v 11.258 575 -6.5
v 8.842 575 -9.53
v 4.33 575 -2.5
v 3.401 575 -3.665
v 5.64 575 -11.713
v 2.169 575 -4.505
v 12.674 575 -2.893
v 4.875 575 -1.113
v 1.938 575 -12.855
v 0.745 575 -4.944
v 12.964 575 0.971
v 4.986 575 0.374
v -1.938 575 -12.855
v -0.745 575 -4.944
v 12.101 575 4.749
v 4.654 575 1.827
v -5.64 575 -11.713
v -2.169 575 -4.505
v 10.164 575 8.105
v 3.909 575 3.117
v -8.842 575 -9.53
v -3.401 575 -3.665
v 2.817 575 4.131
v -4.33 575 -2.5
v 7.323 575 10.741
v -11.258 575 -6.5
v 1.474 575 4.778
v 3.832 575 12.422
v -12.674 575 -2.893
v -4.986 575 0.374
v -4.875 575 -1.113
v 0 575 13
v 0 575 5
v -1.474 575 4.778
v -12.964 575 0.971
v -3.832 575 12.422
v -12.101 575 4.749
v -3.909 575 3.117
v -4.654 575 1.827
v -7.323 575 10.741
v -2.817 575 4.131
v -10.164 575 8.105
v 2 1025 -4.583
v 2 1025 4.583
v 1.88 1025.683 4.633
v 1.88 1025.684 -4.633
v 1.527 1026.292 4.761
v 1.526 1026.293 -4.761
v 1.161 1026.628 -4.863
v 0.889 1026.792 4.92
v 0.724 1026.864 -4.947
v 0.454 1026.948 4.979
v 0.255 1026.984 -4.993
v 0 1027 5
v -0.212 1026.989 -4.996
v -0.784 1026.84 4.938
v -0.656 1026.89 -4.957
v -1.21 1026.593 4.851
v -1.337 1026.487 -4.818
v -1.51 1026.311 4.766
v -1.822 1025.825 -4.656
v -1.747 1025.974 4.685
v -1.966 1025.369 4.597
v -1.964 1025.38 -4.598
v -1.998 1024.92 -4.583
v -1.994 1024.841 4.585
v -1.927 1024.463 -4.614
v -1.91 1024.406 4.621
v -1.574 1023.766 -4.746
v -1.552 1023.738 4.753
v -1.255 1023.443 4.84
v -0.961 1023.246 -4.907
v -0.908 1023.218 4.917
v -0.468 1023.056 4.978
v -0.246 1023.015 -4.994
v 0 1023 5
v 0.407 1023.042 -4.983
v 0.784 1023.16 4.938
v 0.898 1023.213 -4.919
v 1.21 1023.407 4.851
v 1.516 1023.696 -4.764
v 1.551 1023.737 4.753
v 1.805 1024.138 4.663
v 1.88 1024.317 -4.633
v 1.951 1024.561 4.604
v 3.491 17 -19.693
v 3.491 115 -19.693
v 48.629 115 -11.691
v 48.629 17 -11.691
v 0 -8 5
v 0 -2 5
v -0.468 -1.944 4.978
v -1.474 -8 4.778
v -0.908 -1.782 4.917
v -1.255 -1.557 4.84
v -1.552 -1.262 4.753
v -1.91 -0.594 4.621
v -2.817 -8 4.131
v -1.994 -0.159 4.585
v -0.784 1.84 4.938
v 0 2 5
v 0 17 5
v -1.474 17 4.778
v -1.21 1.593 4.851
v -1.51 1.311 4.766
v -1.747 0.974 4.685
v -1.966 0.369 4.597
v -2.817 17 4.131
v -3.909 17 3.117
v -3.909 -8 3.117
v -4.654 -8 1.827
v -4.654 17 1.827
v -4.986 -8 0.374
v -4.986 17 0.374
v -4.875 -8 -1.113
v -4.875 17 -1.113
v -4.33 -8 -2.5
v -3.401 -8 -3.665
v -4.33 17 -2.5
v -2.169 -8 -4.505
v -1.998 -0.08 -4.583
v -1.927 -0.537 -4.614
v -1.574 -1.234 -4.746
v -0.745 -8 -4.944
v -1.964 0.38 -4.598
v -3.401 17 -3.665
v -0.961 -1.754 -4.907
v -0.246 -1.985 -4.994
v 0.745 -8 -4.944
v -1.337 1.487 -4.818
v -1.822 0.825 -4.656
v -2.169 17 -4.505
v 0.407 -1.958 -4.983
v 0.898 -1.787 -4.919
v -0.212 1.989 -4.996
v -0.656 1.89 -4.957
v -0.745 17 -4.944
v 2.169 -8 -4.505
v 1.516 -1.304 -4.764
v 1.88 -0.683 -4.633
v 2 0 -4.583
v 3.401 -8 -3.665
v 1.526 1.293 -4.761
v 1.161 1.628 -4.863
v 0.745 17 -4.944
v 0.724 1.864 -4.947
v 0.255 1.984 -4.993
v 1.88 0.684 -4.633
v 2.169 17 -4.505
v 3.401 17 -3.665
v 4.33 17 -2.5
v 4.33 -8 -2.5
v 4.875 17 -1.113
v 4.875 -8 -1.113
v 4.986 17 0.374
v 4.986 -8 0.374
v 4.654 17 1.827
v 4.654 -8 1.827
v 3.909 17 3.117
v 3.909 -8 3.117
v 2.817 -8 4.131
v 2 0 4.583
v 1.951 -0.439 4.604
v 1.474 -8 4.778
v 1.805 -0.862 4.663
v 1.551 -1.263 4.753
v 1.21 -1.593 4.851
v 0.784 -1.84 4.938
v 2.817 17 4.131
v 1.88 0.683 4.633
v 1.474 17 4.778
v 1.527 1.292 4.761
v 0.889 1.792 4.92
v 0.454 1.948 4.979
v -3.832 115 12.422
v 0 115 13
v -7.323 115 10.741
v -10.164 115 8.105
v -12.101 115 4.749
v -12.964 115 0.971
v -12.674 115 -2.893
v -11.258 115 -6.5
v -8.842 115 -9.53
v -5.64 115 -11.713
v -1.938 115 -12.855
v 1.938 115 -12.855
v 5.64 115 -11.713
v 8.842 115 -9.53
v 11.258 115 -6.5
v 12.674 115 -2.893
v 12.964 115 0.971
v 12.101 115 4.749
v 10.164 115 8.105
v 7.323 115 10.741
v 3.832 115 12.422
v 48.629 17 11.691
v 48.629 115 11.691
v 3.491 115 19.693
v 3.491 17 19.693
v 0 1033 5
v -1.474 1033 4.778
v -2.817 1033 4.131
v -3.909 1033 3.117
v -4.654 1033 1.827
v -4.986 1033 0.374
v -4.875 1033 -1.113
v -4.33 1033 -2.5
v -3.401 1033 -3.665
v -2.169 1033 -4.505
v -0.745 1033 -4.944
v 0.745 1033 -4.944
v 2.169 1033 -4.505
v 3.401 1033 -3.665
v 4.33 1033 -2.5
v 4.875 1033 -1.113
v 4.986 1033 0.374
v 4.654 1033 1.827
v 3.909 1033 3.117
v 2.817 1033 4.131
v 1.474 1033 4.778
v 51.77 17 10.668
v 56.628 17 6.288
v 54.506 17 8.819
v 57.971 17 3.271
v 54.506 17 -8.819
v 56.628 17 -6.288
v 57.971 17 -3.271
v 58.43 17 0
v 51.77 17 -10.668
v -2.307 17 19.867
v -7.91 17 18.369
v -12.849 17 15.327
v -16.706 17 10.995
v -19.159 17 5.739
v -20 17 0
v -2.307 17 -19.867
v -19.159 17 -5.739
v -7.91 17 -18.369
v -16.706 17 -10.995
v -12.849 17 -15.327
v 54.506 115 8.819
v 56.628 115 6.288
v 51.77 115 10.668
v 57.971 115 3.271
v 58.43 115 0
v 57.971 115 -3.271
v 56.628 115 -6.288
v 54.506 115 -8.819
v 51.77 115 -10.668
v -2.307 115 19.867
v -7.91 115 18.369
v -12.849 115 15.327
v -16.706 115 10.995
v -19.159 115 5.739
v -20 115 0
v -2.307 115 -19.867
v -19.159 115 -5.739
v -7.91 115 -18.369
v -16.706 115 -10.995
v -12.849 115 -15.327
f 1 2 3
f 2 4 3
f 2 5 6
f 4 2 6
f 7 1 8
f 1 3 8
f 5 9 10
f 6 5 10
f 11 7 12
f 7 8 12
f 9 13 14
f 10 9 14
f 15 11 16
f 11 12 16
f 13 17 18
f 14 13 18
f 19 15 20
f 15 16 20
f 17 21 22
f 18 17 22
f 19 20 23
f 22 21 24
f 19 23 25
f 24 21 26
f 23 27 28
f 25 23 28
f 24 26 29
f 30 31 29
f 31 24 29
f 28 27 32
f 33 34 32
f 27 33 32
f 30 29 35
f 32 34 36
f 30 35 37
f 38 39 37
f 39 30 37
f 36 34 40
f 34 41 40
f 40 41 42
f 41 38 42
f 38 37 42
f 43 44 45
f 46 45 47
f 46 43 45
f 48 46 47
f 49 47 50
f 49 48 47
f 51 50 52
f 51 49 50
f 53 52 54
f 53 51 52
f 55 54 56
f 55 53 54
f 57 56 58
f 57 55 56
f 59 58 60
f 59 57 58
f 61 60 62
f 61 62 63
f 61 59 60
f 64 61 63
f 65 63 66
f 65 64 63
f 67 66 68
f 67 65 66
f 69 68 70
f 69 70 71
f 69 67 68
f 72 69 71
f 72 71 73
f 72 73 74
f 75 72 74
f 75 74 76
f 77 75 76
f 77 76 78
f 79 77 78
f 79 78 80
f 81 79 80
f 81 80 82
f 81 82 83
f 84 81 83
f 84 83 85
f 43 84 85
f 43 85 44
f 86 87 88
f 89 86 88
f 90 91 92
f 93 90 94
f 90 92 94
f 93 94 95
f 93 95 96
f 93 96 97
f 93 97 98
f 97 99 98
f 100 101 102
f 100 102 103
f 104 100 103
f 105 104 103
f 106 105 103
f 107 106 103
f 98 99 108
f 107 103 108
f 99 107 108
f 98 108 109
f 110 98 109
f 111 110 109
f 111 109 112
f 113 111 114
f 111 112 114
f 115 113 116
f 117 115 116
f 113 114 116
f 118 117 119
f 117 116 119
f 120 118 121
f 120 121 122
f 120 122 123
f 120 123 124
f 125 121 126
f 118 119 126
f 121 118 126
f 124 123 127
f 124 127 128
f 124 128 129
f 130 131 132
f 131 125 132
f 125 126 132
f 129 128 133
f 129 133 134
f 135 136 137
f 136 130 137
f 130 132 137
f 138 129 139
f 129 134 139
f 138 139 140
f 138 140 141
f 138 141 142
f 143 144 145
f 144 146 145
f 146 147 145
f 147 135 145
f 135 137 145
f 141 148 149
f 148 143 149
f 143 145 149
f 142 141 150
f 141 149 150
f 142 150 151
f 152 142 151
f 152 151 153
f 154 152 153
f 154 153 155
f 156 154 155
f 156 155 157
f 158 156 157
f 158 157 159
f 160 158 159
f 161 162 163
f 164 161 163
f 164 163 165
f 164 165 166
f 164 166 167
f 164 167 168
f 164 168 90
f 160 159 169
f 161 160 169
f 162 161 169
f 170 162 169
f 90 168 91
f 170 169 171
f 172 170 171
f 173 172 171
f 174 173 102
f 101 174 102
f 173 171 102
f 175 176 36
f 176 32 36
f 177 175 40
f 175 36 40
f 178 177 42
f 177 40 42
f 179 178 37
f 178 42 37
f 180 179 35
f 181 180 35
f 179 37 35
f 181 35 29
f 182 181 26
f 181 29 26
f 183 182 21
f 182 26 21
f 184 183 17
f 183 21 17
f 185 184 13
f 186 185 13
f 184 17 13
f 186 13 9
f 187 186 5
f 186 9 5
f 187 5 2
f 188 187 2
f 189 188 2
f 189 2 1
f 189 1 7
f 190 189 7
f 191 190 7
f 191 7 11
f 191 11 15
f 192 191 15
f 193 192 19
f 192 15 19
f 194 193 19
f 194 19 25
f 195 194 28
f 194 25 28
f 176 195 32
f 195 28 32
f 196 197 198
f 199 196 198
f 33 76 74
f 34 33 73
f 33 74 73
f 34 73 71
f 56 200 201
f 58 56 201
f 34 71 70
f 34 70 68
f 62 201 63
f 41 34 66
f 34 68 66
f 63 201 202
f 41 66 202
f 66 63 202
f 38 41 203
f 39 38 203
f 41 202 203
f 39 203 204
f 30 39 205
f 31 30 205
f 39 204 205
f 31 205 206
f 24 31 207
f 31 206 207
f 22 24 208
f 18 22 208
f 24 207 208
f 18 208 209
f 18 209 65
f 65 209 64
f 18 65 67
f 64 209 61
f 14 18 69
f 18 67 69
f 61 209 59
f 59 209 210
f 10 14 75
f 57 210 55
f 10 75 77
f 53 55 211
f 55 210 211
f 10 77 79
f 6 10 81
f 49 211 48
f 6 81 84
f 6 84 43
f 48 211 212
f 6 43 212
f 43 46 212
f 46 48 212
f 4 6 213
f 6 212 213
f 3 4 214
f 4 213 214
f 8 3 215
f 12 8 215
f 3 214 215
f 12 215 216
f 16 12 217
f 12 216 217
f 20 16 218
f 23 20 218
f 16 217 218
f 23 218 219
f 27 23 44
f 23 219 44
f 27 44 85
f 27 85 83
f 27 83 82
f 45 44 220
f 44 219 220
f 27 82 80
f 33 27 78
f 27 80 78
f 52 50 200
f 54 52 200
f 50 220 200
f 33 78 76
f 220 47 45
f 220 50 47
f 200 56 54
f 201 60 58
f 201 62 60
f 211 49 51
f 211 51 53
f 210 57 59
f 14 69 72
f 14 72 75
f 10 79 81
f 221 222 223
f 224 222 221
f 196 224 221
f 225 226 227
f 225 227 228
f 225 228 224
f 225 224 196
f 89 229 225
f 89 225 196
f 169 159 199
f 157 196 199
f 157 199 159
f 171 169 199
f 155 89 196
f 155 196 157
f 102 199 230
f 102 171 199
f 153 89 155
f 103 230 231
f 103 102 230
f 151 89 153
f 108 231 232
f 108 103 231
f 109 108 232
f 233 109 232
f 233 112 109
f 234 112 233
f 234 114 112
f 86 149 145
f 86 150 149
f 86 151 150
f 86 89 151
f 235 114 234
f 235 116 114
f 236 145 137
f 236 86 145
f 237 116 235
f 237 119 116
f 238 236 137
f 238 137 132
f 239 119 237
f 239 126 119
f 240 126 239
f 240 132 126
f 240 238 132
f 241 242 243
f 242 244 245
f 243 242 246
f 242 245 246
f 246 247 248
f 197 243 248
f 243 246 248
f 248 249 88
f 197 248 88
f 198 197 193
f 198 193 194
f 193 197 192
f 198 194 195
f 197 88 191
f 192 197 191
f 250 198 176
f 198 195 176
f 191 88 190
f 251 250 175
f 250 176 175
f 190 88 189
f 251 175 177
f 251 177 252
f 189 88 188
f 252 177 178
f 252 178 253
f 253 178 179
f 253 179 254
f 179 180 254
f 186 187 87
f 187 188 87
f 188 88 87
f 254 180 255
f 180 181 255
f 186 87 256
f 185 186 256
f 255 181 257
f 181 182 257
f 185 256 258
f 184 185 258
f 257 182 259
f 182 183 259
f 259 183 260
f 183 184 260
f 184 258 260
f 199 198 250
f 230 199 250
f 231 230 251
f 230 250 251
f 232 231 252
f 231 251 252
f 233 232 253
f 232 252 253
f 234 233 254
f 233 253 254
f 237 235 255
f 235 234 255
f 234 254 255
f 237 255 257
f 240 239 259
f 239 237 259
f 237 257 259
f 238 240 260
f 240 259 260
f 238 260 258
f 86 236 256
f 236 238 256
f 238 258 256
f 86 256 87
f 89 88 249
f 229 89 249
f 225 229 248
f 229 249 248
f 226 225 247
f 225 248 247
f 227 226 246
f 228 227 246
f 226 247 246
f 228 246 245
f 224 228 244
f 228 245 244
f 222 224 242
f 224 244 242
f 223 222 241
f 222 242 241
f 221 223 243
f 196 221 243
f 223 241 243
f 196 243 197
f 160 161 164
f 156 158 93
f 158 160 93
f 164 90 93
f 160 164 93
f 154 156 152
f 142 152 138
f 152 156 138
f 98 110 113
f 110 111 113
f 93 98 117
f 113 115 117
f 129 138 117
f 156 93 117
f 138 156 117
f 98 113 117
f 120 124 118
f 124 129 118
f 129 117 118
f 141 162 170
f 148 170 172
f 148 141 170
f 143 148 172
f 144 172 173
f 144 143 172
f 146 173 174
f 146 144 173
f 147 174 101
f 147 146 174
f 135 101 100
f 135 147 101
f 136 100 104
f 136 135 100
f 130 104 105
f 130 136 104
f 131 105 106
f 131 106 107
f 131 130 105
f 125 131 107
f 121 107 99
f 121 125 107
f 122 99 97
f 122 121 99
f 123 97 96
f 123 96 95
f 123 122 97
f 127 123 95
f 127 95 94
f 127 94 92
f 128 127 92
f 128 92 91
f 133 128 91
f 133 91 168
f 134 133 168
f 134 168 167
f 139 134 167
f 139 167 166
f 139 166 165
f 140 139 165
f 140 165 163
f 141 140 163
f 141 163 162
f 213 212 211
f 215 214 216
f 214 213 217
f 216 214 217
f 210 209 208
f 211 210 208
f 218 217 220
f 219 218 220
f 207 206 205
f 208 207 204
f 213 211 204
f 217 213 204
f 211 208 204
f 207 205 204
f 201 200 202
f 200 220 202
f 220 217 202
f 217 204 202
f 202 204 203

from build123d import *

# Parameters (mm, degrees)
CUT_EXTRUDE2_DEPTH      = 1034.387149136
CUT_EXTRUDE2_DEPTH_BACK = 1034.387149136
SKETCH8_R               = 2
BOSS_EXTRUDE4_DEPTH     = 98


with BuildPart() as part:
    # Sketch7 → Revolve2 (revolve)
    with BuildSketch(Plane(origin=(0, 0, 0), x_dir=(0, 0, -1), z_dir=(1, 0, 0))):
        Polygon((-20, 17), (-20, 115), (-13, 115), (-13, 575), (-5, 575), (-5, 1033), (0, 1033), (0, -8), (-5, -8), (-5, 17), align=None)
    revolve(axis=Axis((0, 1033, 0), (0, -1, 0)))

    # Sketch8 → Cut-Extrude2 (cut, two sides: drawn at the far end of the back side and taken through both)
    with BuildSketch(Plane.XY.offset(-CUT_EXTRUDE2_DEPTH_BACK)):
        with Locations((0, 1025)):
            Circle(SKETCH8_R)
        Circle(SKETCH8_R)
    extrude(amount=CUT_EXTRUDE2_DEPTH + CUT_EXTRUDE2_DEPTH_BACK, mode=Mode.SUBTRACT)

    # Sketch10 → Boss-Extrude4 (add)
    with BuildSketch(Plane(origin=(0, 115, 0), x_dir=(1, 0, 0), z_dir=(0, 1, 0))):
        with BuildLine():
            Line((3.491027189, 19.692961412), (48.629242089, 11.691181882))
            ThreePointArc((48.629242089, 11.691181882), (58.430175518, 0), (48.629242089, -11.691181882))
            Line((48.629242089, -11.691181882), (3.491027189, -19.692961412))
            ThreePointArc((3.491027189, -19.692961412), (-20, 0), (3.491027189, 19.692961412))
        make_face()
    extrude(amount=-BOSS_EXTRUDE4_DEPTH)


solid = part.part
